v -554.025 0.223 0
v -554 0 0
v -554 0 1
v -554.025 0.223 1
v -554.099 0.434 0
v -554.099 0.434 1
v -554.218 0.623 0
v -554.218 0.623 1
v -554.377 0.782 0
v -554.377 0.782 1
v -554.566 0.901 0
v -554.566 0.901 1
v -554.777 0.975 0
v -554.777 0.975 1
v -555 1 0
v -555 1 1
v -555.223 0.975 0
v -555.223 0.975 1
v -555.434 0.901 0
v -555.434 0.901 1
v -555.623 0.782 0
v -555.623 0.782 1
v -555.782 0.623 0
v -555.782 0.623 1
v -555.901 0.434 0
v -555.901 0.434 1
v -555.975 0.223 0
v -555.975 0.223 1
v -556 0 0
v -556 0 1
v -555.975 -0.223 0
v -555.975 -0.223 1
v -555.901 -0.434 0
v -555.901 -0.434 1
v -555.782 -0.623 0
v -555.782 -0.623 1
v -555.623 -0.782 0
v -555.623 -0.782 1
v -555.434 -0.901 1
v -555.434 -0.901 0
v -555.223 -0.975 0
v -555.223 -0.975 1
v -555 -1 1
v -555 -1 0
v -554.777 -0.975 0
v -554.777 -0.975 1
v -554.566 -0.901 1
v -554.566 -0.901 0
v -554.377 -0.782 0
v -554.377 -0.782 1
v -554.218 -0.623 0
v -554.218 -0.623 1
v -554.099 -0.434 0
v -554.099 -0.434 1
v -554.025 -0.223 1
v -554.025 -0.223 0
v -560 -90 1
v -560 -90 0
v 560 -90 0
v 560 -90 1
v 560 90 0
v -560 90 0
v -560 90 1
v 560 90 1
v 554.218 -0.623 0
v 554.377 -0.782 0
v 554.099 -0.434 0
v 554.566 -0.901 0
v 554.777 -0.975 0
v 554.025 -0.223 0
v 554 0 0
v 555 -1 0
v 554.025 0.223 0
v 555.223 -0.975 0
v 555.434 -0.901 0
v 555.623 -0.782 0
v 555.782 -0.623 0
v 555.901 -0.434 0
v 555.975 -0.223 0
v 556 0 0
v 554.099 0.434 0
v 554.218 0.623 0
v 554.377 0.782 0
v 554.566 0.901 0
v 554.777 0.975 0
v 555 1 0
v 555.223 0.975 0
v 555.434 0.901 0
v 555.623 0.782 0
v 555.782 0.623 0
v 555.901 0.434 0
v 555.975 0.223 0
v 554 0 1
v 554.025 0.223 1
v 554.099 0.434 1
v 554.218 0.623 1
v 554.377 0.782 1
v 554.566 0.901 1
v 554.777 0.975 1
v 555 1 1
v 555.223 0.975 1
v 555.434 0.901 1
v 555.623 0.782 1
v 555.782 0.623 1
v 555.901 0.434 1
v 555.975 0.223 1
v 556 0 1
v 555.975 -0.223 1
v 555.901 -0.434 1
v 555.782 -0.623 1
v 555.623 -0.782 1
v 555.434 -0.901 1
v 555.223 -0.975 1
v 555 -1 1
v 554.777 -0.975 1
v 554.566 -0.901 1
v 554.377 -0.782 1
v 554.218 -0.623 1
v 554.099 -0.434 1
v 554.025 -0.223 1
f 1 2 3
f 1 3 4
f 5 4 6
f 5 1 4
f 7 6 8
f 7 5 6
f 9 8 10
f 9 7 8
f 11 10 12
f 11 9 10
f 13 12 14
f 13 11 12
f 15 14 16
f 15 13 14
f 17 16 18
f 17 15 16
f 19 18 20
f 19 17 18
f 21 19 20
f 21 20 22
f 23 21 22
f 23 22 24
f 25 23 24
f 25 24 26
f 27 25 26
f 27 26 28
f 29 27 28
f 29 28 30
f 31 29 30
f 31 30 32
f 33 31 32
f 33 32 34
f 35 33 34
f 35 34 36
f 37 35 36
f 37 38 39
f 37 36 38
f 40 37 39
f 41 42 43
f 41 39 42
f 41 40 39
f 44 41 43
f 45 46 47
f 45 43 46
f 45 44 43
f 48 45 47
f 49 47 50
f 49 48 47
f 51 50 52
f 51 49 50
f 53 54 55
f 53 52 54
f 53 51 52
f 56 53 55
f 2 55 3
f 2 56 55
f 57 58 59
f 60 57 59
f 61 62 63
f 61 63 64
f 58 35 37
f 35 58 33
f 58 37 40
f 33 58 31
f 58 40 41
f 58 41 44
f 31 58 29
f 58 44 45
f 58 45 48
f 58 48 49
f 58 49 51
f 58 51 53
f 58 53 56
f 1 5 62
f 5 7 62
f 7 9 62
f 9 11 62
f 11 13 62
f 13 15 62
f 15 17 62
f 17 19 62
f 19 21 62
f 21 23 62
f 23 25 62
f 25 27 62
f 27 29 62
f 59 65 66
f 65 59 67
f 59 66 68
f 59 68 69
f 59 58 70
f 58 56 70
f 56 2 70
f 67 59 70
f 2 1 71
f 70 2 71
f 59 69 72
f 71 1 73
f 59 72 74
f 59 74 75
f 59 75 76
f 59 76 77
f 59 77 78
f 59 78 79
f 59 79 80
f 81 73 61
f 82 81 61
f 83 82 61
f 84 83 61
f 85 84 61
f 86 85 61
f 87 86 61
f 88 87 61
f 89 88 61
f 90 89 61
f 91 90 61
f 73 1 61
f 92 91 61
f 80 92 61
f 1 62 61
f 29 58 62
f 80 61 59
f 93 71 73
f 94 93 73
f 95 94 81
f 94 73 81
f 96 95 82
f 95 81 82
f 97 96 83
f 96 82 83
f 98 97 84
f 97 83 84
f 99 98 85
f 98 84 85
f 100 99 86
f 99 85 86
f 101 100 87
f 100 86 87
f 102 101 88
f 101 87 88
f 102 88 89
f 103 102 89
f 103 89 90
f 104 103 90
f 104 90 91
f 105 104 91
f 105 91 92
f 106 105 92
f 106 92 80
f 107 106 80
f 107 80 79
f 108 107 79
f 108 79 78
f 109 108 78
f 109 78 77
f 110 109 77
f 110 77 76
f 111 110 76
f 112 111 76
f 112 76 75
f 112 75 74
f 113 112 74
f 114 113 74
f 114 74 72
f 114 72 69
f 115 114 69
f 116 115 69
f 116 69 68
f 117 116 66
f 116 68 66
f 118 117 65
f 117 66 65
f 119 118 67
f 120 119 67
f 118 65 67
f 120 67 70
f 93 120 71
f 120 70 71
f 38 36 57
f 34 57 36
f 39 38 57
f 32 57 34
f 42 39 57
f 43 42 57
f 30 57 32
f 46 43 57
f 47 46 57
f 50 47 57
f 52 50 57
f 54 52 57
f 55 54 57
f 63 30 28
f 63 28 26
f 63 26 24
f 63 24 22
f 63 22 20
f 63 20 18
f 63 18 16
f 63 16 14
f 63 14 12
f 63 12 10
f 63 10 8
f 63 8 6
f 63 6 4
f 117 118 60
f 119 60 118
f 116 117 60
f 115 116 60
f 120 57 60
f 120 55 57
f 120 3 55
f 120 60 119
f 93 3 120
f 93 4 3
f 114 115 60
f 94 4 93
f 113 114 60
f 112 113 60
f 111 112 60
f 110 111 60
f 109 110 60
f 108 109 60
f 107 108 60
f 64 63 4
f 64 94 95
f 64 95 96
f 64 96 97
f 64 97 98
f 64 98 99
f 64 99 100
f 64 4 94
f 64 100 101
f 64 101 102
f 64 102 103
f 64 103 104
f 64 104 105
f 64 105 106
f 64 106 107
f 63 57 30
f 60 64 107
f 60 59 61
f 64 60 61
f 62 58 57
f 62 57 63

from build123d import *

# Parameters (mm, degrees)
SKETCH1_W           = 1120
SKETCH1_H           = 180
BOSS_EXTRUDE1_DEPTH = 1
SKETCH2_R           = 1
CUT_EXTRUDE1_DEPTH  = 2


with BuildPart() as part:
    # Sketch1 → Boss-Extrude1 (new body)
    with BuildSketch(Plane.XY):
        Rectangle(SKETCH1_W, SKETCH1_H)
    extrude(amount=BOSS_EXTRUDE1_DEPTH)

    # Sketch2 → Cut-Extrude1 (cut, through all)
    with BuildSketch(Plane(origin=(0, 0, 0), x_dir=(-1, 0, 0), z_dir=(0, 0, -1))):
        with Locations((-555, 0)):
            Circle(SKETCH2_R)
    cut_extrude1 = extrude(amount=-CUT_EXTRUDE1_DEPTH, mode=Mode.SUBTRACT)

    # Mirror1: Cut-Extrude1 across plane
    add(cut_extrude1.mirror(Plane(origin=(0, 0, 0), x_dir=(0, 0, 1), z_dir=(1, 0, 0))), mode=Mode.SUBTRACT)


solid = part.part
